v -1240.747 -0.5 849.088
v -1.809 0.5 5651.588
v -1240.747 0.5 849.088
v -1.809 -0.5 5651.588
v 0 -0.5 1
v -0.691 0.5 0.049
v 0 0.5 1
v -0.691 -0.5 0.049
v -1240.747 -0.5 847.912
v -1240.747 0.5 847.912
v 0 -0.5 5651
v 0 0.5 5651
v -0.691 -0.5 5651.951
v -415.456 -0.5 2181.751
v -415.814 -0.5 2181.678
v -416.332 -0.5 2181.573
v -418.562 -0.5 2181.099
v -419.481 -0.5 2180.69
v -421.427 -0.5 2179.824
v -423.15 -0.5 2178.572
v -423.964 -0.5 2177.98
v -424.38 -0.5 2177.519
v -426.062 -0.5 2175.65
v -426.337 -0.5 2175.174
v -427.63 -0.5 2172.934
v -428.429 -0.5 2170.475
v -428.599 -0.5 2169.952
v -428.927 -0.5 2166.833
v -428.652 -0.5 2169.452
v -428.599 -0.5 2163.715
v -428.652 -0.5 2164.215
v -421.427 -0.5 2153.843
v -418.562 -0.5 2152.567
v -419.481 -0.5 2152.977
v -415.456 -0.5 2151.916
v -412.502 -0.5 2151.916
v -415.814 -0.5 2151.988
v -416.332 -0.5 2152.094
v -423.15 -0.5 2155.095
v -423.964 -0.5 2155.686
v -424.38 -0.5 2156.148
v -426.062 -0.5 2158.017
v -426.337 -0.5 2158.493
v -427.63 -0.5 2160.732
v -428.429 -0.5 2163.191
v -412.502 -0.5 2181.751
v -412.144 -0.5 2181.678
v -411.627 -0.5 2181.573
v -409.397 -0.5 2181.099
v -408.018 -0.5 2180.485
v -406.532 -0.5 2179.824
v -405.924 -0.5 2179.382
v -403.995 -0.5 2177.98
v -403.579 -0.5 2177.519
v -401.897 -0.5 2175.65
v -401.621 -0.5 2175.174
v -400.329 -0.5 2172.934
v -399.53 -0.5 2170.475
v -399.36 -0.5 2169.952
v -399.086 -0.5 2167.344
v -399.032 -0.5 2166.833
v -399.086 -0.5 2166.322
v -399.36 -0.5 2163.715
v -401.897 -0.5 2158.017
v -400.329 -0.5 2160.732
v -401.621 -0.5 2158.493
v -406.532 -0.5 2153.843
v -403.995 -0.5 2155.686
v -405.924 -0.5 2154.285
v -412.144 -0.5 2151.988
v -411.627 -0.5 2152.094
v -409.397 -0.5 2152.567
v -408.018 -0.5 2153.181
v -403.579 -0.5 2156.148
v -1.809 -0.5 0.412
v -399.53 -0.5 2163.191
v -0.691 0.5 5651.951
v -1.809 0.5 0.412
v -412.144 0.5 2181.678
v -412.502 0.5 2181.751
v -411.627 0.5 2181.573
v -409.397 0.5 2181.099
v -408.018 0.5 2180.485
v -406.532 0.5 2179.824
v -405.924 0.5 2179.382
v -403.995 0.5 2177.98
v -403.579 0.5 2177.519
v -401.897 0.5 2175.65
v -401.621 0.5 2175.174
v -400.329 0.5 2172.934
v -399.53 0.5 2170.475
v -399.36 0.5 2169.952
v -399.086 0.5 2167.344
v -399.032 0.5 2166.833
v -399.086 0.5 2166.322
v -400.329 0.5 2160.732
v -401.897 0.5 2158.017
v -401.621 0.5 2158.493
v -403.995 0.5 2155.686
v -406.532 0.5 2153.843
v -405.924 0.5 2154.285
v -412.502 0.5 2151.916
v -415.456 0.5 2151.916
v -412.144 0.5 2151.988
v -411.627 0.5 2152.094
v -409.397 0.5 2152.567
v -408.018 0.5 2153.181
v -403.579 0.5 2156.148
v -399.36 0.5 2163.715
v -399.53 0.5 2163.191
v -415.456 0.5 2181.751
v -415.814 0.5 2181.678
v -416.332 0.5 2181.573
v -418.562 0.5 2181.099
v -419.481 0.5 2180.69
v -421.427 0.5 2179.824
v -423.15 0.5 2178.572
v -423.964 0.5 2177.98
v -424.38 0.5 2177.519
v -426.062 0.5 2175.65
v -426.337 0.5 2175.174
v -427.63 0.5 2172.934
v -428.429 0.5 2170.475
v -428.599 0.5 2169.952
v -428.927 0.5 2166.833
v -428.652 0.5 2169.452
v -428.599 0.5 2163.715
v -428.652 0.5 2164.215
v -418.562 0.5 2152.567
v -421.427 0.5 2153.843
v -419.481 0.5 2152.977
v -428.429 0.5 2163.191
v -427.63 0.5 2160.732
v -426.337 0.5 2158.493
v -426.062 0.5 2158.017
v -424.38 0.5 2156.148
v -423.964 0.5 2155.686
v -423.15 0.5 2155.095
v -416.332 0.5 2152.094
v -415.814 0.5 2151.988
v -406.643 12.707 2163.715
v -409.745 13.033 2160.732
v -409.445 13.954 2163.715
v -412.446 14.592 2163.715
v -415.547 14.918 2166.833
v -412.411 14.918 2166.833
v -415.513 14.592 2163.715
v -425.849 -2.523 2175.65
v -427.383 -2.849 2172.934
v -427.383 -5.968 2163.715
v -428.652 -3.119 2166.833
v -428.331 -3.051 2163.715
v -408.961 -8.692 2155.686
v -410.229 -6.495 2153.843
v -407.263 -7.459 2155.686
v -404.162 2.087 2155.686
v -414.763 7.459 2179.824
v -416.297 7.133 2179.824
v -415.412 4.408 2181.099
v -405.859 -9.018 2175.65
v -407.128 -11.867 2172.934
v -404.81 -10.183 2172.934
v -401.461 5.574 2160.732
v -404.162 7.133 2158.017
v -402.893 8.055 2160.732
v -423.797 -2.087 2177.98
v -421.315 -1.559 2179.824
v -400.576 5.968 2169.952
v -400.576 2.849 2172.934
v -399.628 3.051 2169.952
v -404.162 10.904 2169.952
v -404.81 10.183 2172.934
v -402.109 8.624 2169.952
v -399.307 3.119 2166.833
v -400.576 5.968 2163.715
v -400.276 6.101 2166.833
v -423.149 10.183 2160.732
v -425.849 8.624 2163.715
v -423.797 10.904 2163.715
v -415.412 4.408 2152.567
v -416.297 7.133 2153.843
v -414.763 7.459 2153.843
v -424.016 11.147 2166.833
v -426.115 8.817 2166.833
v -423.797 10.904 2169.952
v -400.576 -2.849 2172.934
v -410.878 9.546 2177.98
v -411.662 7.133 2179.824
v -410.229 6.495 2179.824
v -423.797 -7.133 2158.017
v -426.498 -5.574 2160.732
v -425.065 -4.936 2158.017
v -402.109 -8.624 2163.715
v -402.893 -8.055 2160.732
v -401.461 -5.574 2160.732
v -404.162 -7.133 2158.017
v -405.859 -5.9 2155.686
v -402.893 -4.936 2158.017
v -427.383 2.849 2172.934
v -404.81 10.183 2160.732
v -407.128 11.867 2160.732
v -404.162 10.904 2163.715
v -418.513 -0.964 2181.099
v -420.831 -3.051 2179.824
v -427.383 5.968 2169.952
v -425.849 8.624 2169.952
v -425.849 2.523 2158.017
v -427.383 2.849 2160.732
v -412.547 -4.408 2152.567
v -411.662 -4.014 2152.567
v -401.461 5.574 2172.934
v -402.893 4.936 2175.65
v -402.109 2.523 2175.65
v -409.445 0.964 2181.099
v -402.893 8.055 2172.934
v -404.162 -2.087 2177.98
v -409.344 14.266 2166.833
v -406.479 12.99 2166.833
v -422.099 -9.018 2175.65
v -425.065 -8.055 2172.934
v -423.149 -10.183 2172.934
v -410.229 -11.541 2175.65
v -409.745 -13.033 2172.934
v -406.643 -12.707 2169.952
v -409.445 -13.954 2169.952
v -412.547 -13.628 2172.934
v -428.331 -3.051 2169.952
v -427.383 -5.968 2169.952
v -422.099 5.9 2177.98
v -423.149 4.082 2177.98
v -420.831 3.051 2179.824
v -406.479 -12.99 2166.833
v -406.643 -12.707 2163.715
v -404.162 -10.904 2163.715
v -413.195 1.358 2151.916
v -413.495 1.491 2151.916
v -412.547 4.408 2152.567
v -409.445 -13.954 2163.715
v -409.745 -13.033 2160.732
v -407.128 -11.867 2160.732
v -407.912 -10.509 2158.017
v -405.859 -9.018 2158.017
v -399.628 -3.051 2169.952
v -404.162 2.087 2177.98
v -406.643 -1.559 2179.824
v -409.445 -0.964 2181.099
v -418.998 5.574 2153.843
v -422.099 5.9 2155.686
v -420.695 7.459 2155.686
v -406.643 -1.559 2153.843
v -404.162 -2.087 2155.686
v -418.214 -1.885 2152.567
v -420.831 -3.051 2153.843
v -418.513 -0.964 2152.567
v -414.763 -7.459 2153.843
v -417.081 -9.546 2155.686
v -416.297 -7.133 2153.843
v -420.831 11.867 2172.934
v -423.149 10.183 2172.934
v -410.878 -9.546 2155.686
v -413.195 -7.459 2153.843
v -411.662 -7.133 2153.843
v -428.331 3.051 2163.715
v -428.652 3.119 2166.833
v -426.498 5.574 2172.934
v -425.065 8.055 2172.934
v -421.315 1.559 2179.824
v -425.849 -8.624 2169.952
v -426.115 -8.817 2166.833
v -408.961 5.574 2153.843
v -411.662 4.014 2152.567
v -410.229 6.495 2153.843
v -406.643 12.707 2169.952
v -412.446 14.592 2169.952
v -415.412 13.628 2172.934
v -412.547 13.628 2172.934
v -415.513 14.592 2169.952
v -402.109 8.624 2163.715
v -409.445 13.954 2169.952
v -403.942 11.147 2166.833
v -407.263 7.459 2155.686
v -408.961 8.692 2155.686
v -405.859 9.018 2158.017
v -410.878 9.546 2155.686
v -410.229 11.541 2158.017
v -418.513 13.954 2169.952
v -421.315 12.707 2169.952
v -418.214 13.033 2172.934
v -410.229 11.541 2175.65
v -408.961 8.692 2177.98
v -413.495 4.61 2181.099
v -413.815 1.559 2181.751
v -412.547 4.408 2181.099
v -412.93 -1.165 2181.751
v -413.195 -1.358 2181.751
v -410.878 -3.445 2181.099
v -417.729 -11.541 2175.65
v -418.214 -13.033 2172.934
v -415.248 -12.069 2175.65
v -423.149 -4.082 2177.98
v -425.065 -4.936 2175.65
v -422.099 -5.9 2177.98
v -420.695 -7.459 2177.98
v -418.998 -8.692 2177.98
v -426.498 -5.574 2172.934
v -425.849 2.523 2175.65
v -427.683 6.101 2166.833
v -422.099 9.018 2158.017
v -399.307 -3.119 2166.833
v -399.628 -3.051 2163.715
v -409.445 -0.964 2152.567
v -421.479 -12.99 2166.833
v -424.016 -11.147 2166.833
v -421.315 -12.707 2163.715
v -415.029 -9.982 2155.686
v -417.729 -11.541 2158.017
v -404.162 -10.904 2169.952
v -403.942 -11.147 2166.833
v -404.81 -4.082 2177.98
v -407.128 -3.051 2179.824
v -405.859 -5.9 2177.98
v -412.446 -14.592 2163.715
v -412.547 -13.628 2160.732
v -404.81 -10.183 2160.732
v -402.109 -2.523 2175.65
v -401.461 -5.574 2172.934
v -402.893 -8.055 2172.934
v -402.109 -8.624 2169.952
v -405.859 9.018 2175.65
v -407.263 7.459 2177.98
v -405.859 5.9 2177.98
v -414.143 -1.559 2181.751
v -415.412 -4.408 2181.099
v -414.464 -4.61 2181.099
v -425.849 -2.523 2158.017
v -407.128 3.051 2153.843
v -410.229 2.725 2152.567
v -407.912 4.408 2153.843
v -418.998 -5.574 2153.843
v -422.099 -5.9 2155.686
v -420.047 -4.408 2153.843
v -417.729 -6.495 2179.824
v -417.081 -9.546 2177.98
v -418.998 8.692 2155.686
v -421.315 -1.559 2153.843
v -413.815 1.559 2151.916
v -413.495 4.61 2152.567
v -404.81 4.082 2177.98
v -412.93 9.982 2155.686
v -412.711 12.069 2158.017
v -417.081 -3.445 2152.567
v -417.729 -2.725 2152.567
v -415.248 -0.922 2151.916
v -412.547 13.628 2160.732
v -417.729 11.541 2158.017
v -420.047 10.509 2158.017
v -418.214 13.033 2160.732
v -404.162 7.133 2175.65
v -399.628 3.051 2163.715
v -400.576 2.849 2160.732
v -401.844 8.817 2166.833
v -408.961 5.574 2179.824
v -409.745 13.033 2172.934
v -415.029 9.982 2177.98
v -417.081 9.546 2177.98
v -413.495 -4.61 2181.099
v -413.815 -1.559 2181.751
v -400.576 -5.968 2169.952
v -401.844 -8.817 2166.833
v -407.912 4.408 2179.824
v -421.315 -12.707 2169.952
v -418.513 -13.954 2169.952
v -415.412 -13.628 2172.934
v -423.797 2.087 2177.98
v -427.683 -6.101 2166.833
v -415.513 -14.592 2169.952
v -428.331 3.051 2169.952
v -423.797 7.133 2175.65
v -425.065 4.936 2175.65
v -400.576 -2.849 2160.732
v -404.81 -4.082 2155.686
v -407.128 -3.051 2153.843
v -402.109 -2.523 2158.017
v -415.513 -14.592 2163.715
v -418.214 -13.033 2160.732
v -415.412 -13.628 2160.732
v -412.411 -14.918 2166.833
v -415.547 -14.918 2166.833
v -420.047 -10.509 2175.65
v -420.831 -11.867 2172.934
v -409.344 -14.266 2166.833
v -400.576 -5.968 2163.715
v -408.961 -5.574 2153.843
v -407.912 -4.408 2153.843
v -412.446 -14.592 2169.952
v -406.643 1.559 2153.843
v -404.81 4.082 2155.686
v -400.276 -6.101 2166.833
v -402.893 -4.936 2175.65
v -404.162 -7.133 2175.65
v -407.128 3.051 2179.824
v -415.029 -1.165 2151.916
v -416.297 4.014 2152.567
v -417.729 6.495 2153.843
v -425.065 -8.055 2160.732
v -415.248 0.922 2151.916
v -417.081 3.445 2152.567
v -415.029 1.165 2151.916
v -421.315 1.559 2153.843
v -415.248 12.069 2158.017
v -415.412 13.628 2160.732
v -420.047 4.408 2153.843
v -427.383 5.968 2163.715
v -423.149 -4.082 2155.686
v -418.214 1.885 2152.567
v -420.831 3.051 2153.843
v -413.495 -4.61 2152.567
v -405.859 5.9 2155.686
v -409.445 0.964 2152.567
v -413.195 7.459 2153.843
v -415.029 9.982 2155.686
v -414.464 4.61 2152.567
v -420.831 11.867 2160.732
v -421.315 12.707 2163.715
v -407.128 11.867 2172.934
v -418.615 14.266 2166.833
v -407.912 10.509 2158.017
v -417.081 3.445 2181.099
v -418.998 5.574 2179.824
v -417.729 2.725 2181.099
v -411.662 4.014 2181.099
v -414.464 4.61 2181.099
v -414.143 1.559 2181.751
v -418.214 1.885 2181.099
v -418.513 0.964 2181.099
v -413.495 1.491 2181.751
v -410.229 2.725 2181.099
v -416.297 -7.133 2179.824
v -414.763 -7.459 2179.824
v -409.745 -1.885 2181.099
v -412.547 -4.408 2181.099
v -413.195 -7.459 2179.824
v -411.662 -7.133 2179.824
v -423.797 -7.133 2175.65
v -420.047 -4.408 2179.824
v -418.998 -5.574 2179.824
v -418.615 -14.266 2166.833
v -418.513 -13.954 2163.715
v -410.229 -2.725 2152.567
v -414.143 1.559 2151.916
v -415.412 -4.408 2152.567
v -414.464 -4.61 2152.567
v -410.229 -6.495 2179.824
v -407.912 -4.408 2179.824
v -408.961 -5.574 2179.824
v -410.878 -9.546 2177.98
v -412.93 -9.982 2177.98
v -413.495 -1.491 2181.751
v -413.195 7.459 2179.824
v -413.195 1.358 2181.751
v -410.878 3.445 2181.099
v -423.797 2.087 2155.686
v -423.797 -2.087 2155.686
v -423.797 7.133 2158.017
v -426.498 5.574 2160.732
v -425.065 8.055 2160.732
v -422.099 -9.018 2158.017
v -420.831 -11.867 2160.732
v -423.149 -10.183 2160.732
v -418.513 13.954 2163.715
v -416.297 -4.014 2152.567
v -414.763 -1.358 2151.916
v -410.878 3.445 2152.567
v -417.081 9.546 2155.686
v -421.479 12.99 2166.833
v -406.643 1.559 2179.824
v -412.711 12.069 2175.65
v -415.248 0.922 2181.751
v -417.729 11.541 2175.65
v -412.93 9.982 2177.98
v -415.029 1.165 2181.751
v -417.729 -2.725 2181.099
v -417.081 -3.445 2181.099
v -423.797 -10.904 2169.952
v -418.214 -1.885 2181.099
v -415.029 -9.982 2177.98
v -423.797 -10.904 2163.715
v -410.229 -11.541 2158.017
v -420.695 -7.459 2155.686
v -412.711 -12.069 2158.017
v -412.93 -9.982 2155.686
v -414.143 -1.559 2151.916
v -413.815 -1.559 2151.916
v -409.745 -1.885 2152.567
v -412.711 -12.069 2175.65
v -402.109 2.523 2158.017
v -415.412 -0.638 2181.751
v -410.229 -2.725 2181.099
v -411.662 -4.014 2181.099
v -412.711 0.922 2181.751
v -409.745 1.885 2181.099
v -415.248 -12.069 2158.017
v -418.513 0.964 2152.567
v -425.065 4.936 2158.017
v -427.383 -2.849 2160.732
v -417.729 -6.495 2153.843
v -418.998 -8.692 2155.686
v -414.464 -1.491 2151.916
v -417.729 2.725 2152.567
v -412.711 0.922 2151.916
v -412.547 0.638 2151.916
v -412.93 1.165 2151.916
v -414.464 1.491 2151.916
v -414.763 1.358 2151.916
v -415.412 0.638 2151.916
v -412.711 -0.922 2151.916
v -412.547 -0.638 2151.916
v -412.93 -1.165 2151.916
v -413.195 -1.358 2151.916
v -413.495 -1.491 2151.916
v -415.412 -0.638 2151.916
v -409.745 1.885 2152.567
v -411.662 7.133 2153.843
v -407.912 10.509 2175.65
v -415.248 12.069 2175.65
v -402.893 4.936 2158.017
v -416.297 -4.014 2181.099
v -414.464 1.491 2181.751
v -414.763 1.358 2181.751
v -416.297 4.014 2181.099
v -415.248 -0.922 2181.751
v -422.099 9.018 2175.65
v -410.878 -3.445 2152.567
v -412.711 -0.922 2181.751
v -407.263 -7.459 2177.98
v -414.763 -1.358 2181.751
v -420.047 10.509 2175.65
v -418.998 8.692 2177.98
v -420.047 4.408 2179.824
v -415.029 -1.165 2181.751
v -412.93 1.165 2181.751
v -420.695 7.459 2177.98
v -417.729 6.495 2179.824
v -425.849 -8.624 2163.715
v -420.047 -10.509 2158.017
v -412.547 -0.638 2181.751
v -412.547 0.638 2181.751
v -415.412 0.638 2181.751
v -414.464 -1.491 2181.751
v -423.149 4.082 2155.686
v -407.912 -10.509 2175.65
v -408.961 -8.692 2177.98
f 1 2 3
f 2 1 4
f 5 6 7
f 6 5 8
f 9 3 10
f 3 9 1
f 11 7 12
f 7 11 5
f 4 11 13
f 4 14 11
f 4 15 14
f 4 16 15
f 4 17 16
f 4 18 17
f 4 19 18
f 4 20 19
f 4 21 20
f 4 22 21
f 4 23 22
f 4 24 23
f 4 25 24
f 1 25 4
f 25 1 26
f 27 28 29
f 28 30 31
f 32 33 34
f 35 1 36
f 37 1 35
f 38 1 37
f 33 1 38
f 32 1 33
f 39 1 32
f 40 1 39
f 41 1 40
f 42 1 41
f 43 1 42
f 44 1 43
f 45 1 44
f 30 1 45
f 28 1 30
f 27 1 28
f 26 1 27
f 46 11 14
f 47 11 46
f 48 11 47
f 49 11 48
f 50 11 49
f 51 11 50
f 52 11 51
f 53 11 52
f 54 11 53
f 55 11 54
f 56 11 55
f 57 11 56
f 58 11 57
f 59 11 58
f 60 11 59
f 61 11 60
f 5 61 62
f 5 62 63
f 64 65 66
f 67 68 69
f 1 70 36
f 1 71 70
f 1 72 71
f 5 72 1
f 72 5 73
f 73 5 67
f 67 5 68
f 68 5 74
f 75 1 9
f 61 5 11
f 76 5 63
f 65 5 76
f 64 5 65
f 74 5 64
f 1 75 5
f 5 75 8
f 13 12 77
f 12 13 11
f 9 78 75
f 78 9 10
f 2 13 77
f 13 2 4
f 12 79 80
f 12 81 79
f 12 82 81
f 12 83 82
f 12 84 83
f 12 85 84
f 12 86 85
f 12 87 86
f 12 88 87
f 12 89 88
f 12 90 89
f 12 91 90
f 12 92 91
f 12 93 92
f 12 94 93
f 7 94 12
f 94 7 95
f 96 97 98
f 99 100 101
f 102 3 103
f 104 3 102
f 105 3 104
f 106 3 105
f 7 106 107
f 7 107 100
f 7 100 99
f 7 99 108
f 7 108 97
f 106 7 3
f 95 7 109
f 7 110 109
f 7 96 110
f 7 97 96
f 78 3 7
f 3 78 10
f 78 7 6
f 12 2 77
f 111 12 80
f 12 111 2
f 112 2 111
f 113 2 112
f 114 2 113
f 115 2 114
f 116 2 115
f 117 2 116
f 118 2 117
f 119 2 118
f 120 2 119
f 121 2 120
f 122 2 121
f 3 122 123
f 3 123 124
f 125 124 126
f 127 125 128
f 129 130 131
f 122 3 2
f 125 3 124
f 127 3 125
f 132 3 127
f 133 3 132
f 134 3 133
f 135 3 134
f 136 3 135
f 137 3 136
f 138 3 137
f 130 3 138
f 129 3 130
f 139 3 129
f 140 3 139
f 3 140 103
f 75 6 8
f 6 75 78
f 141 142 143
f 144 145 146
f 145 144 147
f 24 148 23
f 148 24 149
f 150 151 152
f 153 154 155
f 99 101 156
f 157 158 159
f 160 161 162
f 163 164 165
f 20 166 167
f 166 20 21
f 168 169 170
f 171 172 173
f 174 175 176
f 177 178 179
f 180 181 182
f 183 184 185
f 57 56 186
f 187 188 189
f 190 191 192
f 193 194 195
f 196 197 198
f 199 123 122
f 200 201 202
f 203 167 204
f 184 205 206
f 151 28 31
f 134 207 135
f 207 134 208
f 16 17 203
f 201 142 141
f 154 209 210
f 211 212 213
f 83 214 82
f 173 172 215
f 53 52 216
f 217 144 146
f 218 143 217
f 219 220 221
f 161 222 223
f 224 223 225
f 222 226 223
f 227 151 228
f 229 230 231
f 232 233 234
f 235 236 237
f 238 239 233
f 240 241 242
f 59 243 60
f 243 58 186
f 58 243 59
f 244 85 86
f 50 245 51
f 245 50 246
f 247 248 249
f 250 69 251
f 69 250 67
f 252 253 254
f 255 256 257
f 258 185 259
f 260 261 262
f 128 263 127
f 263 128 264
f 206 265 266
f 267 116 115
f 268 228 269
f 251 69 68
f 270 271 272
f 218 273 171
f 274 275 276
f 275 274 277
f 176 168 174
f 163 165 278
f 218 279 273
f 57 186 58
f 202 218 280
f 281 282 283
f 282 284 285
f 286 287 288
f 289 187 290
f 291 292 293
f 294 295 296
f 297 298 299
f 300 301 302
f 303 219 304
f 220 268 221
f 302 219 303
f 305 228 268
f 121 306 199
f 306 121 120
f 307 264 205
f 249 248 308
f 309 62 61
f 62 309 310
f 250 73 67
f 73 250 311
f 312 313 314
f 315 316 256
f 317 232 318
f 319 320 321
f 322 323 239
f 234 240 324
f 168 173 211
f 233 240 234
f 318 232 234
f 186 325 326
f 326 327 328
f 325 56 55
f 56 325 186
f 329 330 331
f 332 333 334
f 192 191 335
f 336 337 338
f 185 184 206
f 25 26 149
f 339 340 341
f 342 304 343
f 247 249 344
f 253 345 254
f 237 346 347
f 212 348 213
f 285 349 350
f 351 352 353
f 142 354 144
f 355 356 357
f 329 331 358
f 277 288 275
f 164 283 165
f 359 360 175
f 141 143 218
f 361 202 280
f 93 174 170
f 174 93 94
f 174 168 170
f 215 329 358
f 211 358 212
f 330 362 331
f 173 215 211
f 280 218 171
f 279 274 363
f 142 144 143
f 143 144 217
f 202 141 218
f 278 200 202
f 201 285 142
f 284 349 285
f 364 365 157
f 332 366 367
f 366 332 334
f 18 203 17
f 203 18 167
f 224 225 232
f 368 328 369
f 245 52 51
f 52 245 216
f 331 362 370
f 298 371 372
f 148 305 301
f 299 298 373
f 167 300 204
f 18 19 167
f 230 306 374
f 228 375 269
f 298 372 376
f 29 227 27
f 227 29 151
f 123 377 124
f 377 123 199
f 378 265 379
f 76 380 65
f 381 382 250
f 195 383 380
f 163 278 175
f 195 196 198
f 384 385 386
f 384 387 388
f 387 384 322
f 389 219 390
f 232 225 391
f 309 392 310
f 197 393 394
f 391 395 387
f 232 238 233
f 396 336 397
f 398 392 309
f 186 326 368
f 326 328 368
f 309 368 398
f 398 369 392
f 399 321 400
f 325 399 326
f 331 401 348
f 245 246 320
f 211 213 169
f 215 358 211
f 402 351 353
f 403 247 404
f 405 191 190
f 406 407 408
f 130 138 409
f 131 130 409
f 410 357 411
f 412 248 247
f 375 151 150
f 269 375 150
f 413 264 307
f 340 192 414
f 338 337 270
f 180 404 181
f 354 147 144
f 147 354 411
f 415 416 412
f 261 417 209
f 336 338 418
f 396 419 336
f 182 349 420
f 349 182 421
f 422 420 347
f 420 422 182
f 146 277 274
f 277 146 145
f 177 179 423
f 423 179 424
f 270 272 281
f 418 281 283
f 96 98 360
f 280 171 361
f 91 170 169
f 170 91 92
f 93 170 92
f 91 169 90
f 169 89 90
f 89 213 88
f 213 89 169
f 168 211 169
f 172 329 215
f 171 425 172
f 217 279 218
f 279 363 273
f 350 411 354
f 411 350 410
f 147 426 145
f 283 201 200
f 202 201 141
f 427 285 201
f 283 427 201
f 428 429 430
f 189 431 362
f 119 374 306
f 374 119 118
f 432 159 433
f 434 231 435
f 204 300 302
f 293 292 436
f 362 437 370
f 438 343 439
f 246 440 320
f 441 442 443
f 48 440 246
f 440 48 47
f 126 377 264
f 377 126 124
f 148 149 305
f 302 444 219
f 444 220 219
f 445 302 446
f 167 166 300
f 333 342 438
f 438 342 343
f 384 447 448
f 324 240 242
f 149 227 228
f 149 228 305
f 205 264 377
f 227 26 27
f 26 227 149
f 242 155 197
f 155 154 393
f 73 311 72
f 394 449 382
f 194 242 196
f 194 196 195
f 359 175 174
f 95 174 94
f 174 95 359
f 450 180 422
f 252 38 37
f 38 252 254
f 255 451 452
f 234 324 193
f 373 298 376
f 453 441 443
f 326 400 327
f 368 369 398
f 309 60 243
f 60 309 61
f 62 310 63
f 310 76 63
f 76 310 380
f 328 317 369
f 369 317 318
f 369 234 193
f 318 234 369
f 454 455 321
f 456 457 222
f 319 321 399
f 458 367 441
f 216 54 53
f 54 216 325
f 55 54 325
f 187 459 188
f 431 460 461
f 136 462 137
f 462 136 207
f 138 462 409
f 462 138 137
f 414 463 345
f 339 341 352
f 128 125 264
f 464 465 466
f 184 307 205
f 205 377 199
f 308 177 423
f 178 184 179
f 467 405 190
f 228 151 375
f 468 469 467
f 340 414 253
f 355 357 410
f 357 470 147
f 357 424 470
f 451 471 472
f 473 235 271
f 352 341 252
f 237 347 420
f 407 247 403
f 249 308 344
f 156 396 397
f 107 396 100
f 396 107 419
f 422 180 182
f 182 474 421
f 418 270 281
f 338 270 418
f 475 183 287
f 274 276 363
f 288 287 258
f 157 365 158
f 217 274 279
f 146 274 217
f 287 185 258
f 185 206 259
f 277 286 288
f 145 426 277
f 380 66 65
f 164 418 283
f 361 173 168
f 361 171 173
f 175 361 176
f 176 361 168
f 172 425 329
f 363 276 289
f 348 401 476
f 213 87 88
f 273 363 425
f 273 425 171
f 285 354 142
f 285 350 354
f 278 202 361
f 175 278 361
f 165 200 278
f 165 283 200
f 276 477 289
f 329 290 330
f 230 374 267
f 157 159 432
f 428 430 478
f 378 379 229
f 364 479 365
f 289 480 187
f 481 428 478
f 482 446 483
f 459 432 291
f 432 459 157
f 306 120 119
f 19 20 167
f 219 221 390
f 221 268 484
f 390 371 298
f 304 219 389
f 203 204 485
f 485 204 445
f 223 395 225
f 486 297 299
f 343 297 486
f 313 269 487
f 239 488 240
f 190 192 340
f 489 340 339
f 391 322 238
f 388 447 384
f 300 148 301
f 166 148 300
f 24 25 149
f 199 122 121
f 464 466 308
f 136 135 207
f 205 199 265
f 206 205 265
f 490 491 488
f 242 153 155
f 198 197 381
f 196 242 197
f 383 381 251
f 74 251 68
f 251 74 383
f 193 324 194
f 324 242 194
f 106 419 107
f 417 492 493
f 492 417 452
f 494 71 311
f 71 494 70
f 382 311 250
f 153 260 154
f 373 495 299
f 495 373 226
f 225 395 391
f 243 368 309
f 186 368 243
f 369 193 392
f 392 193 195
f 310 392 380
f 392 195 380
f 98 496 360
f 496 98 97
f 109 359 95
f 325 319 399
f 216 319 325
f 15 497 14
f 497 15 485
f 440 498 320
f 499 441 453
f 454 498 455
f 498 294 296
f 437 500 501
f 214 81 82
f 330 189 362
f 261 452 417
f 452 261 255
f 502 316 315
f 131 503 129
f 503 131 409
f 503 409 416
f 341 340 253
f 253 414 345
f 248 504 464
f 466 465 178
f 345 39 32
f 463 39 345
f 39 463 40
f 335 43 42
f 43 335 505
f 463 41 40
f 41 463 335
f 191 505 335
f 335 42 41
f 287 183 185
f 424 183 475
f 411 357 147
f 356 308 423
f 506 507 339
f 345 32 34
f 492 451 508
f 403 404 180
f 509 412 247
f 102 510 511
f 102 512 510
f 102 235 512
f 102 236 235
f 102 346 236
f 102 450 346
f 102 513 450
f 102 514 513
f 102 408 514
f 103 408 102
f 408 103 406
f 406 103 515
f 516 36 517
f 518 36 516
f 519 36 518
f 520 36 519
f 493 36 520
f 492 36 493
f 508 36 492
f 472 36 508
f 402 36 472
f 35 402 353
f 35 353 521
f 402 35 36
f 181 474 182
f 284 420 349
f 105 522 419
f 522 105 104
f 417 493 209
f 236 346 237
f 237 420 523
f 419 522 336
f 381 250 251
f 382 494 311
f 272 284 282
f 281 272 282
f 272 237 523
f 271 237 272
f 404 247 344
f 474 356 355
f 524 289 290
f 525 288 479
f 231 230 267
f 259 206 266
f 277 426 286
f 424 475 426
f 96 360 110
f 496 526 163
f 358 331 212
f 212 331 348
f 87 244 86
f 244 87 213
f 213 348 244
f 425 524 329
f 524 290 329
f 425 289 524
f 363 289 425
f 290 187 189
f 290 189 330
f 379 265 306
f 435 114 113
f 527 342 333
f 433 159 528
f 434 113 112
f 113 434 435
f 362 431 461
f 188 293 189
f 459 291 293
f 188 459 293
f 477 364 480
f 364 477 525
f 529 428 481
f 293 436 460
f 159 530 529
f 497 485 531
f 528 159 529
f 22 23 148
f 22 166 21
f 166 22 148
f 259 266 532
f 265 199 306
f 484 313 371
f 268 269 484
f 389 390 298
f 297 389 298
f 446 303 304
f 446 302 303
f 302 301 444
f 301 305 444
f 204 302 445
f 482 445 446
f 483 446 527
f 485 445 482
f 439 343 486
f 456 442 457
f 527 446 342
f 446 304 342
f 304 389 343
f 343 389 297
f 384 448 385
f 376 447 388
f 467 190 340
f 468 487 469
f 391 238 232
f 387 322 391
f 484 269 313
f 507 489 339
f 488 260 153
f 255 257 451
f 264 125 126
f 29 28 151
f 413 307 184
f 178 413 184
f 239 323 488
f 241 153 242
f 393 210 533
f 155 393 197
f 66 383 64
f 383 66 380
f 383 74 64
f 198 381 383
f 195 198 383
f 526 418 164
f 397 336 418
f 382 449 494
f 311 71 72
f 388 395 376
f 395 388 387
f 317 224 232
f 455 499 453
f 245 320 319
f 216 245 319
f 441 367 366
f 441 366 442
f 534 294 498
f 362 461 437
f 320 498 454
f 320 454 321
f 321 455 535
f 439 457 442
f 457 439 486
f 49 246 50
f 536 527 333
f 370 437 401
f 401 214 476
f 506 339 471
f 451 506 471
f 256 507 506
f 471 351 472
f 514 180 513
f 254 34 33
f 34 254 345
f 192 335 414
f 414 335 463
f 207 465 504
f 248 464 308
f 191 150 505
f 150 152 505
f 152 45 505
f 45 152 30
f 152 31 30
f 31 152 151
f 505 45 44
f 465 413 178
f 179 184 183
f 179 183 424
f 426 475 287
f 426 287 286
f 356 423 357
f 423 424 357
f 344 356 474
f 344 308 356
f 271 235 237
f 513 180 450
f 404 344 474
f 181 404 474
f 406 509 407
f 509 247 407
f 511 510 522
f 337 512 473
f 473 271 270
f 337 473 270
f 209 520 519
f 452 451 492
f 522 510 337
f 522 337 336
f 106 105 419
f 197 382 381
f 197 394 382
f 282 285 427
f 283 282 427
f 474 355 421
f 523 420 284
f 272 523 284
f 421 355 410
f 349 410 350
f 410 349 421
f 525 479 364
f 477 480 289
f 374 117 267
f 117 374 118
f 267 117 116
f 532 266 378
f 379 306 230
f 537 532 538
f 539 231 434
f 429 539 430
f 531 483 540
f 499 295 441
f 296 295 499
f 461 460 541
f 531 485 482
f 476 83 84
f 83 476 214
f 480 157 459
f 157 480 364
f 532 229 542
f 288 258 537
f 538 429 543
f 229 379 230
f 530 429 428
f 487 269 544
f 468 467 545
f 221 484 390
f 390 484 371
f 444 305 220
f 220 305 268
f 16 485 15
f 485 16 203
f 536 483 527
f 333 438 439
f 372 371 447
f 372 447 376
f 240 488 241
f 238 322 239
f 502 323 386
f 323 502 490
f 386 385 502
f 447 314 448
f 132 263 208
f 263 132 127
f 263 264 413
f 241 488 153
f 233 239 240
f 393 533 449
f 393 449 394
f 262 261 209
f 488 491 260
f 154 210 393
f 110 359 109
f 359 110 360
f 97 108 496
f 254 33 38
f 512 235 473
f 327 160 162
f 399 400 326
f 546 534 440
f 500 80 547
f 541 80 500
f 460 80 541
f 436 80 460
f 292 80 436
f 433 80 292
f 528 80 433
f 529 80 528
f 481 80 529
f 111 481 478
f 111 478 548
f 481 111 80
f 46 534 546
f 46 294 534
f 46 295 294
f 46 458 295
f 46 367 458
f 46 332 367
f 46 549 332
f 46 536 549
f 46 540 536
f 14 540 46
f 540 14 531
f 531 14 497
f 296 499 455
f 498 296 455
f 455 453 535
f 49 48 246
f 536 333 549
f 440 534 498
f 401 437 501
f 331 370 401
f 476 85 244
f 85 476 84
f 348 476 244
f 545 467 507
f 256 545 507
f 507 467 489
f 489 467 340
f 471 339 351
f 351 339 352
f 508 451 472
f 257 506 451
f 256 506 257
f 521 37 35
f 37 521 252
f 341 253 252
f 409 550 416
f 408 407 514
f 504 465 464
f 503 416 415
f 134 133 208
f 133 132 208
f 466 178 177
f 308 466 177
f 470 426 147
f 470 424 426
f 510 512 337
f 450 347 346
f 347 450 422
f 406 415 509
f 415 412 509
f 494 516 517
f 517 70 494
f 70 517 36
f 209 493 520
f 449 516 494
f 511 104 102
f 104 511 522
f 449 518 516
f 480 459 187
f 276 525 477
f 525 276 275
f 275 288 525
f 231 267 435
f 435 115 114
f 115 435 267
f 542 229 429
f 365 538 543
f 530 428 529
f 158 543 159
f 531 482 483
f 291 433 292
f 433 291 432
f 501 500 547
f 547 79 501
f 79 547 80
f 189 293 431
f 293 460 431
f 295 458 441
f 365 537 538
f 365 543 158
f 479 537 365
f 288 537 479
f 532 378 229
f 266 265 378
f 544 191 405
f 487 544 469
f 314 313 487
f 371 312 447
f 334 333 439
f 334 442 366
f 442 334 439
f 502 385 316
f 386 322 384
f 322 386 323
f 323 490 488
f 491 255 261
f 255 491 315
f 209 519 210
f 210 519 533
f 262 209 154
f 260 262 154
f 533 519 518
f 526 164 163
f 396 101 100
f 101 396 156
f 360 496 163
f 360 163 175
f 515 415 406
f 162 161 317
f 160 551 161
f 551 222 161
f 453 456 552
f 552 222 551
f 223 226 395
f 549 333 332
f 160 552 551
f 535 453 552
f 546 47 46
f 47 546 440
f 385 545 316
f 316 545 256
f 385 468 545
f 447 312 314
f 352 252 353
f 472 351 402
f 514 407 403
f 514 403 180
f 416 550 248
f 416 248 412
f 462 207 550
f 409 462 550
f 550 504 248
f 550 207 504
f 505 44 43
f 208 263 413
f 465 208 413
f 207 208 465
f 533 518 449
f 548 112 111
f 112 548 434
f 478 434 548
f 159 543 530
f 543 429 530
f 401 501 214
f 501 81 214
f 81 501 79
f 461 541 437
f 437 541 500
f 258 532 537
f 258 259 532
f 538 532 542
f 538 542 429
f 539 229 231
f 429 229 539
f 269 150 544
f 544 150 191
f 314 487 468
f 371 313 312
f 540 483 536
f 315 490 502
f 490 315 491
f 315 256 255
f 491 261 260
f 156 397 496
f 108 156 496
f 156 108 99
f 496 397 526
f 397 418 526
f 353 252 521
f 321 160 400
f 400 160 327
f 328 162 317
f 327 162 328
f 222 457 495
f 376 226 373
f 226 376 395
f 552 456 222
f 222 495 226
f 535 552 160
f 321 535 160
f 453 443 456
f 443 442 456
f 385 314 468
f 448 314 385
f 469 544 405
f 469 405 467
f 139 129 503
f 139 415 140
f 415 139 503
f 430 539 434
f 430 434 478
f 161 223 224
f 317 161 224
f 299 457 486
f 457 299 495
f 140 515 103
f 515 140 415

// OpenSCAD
sideA = 1500;
sideC = 5650;
sideB = 4960;

bcCosA = ( sideB*sideB + sideC*sideC -  sideA*sideA) / 2;

aDegs = acos(bcCosA / (sideB * sideC ));

sideA2 = sideC * sin(aDegs);
sideB2 = sideC * cos(aDegs);

dH = sideB2 - sideB;

echo ( "sideA2", sideA2) ;
echo ( "sideB2", sideB2) ;
echo ( "dH", dH) ;


// translate([sideA2, 0, -dH])
// rotate([0, -aDegs, 0])
Staksel_perspective(3.5, 5.65, 0.15);

// (площадь кв мв, длина передней шк-ны м, коэффициент подъёма заднего угла ( 0 ... 1 )
module Staksel_perspective(s, fstSka, shkotHeightK){
  
  pt = 1;

  fstSkaLen = 1000 * fstSka;
  heightBLen = s * 2 /  fstSka * 1000;

  echo("stacksel heightBLen = ", heightBLen) ;

  offsetBLen = fstSkaLen * shkotHeightK;
  
  echo("stacksel offsetBLen = ", offsetBLen) ;


  hull()  { 
 
   // Начало
    translate([ -pt , 0 , pt ]) 
    rotate([ 90 , 0 , 0 ])
    cylinder( r = pt , h = pt , center = true );

    // Верхний угол
    translate([-pt, 0 , pt + fstSkaLen ]) 
    rotate([ 90 , 0 , 0 ])
    cylinder( r = pt , h = pt , center = true );

    // задний угол
    translate([ -pt-heightBLen , 0 , pt + offsetBLen]) 
    rotate([ 90 , 0 , 0 ])
    cylinder( r = pt , h = pt , center = true );
  
  }
  
  translate([ -pt-heightBLen/3, 0 , pt + (offsetBLen + fstSkaLen)/3 ])
  sphere(d = 30);

  // Угол наклона плоскости шкота
  alfa = atan((fstSkaLen/2-offsetBLen)/heightBLen);
    
//  translate([ -pt-heightBLen , 0 , pt + offsetBLen]) 
//  rotate([ 0 , -alfa , 0 ])
//  cylinder( r = pt*2000 , h = pt , center = true );

}
